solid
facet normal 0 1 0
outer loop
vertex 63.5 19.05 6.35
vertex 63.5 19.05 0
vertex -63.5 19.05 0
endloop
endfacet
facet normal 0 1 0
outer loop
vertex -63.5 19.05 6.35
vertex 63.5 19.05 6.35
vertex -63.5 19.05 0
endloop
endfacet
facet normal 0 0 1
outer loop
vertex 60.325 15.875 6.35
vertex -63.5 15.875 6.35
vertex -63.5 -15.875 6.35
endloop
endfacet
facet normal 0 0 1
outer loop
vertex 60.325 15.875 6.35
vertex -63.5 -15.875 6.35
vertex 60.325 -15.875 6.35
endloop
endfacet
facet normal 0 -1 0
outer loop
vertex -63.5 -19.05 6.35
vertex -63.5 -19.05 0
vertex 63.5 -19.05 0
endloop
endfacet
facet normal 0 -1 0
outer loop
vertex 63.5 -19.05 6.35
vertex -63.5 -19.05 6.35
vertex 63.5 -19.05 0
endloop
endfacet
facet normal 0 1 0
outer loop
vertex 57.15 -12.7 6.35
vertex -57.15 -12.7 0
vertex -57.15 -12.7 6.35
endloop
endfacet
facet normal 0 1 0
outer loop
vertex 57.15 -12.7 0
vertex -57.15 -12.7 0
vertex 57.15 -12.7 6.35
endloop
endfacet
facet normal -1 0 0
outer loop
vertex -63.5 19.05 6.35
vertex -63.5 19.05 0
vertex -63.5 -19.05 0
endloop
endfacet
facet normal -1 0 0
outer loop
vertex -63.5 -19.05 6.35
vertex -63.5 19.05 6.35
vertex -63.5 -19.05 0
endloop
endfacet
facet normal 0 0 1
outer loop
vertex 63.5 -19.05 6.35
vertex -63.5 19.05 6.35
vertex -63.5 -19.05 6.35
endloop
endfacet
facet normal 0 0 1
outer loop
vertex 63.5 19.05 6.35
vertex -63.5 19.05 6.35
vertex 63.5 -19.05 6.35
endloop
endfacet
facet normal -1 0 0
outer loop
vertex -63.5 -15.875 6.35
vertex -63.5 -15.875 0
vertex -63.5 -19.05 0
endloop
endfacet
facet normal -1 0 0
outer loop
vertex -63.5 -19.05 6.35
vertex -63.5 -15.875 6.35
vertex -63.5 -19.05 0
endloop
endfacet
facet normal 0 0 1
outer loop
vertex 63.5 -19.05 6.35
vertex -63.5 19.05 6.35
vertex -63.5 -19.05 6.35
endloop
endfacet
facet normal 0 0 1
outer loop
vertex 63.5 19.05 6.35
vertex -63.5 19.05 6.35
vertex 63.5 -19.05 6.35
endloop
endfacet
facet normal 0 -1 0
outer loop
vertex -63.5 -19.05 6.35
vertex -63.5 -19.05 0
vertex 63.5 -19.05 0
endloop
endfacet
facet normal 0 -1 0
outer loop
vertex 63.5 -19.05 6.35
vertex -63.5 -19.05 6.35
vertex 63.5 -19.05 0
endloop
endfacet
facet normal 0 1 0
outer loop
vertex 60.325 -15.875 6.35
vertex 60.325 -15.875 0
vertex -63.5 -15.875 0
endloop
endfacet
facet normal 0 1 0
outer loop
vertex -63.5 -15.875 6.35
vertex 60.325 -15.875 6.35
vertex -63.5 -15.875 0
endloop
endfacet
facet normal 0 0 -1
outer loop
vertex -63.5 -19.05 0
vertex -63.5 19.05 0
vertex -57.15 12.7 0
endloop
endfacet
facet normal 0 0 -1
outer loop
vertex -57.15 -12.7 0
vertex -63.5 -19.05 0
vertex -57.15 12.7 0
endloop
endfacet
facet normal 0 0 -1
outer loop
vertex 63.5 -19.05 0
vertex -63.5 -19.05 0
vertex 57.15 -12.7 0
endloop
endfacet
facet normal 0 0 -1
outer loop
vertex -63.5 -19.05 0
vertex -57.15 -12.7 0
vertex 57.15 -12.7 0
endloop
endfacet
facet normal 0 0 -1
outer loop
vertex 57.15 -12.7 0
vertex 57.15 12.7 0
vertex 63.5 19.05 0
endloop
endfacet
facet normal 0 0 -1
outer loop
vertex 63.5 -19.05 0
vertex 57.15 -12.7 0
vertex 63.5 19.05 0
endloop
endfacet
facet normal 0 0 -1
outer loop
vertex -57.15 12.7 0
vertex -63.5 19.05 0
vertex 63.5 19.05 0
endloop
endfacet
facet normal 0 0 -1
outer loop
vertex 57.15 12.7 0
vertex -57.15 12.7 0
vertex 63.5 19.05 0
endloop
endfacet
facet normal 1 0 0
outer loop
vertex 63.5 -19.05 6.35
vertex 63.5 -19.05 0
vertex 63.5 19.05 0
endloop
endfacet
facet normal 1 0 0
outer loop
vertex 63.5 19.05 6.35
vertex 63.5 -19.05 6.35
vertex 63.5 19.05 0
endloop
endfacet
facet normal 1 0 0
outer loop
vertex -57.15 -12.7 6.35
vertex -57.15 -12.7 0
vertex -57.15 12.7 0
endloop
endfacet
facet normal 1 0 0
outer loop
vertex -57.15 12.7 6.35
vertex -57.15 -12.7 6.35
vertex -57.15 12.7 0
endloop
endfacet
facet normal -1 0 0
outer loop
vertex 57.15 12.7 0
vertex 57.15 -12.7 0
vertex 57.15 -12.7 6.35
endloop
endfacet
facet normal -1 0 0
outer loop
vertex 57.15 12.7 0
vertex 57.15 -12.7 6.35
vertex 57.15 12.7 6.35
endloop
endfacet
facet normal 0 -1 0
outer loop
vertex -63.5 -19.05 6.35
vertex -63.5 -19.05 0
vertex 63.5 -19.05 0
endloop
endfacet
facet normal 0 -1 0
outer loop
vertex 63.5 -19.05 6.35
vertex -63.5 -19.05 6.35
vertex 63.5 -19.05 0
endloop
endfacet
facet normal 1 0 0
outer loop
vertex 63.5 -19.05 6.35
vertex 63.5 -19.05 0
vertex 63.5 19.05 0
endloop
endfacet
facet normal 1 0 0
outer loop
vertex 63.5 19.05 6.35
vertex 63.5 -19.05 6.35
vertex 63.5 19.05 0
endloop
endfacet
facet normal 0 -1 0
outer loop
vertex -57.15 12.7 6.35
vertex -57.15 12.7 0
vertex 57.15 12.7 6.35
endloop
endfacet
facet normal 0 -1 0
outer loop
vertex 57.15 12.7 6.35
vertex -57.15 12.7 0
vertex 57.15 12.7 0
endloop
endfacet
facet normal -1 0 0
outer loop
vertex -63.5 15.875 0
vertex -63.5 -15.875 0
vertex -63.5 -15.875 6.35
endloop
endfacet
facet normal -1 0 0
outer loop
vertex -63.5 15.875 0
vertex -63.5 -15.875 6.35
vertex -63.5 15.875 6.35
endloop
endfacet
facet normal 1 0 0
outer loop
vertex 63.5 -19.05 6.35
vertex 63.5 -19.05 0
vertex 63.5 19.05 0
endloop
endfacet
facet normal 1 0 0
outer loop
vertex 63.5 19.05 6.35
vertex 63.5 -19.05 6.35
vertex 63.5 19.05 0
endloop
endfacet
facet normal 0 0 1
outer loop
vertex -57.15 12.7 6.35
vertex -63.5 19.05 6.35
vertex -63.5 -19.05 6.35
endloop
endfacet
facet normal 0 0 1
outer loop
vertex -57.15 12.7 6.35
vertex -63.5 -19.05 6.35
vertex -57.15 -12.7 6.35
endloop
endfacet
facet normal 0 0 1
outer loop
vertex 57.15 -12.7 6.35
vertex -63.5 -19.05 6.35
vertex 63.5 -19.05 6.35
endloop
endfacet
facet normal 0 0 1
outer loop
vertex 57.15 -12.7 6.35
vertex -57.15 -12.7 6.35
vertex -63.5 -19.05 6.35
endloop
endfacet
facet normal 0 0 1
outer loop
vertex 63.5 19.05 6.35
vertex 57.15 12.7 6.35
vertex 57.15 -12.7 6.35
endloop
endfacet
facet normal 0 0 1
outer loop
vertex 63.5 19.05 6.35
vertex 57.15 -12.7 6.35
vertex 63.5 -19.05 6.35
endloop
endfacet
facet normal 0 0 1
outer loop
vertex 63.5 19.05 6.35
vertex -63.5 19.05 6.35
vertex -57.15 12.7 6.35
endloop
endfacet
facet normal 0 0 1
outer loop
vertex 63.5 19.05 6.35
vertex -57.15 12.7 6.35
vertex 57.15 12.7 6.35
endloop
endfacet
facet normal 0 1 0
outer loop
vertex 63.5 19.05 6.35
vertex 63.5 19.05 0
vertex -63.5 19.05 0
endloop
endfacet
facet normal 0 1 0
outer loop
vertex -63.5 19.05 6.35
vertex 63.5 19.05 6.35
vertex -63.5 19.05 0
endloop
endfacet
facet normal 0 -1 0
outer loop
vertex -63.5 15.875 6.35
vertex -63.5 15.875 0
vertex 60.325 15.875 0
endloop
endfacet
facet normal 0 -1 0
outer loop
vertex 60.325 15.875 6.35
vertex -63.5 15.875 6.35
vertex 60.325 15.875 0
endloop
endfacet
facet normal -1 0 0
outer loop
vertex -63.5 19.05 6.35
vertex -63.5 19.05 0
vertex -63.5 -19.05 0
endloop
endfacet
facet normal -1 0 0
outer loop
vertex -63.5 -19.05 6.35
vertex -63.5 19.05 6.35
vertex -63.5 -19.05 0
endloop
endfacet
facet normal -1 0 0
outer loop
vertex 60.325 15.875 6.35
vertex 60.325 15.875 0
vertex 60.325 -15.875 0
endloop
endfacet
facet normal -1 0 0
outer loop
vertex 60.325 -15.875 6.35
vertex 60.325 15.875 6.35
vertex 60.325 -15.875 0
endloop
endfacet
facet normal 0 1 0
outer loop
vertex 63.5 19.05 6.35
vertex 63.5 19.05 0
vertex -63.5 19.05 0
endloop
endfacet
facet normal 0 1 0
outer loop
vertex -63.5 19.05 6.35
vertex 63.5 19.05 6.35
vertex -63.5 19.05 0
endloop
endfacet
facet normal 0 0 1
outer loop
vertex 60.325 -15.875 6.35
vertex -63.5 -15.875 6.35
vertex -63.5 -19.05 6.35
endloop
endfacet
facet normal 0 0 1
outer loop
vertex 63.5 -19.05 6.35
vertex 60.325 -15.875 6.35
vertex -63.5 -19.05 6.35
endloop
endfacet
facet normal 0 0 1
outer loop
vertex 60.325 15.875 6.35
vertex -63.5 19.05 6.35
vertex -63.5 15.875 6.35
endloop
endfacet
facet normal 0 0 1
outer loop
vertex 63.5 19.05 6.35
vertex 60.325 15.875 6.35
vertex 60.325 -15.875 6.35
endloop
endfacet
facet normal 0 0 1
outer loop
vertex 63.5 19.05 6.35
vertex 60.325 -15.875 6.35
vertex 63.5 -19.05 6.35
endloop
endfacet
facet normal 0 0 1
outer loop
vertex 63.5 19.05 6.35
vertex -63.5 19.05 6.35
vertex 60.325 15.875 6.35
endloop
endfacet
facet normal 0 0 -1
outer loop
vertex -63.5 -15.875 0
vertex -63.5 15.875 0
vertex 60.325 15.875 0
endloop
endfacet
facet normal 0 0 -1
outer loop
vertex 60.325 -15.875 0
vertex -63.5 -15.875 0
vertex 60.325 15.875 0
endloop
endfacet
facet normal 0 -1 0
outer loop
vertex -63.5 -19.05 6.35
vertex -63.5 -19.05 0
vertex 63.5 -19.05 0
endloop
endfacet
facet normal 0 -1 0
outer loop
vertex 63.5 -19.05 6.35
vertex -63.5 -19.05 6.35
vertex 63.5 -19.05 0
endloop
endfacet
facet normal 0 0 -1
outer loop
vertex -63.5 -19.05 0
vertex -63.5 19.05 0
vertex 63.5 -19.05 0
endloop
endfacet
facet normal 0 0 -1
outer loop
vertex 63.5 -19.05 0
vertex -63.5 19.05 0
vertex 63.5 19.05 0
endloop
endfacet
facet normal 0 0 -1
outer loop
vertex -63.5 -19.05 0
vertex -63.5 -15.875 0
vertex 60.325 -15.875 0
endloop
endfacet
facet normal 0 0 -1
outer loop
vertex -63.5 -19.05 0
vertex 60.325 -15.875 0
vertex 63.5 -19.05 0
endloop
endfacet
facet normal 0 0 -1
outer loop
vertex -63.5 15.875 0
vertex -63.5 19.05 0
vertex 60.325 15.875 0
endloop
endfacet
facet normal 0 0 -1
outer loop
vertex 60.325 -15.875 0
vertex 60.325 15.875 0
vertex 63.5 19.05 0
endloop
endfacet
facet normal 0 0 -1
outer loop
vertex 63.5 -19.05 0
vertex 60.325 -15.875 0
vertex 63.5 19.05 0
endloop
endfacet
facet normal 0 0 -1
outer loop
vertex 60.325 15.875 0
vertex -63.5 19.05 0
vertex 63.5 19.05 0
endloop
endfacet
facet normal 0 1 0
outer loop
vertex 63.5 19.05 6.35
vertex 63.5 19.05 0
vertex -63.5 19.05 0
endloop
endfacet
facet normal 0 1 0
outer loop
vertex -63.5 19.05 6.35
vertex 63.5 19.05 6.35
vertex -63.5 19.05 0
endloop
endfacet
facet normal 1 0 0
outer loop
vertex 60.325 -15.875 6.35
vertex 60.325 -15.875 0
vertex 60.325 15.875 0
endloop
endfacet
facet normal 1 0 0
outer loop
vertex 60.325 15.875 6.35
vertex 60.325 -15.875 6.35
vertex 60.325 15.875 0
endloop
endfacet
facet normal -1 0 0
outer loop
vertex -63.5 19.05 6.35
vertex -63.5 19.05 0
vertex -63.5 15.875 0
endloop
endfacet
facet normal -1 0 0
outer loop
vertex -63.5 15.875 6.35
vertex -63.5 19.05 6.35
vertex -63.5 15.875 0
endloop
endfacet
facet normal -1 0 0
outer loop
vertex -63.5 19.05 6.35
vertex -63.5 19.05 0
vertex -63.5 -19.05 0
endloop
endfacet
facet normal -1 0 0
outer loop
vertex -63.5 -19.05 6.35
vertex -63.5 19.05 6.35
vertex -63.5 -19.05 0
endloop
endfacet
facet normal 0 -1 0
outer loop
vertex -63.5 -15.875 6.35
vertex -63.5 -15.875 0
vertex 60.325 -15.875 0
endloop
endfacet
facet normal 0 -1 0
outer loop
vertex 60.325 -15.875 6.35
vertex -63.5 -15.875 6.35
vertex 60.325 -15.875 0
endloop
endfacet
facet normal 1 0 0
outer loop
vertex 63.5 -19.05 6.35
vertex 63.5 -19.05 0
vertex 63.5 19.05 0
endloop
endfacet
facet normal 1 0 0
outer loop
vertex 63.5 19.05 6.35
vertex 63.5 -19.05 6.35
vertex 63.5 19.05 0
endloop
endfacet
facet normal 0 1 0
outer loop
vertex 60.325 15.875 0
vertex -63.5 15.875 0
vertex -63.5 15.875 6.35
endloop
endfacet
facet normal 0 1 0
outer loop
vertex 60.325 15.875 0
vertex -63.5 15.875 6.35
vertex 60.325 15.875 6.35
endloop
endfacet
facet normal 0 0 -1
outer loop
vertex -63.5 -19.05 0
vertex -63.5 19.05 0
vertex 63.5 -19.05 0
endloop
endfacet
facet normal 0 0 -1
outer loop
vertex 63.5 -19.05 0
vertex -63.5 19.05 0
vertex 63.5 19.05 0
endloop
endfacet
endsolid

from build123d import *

# Parameters (mm, degrees)
F1_W     = 123.825
F1_H     = 31.75
F1_W_2   = 114.3
F1_H_2   = 25.4
F2_DEPTH = 6.35
F3_DEPTH = 6.35
F4_DEPTH = 6.35
F5_DEPTH = 6.35
F6_DEPTH = 6.35


# Not quite as in the source:
# - a variable given as a bare number and used for a length is read in inches; the dataset says mm whatever the document's units were


with BuildPart() as f2:
    # F1 (on Top) → F2 (new body)
    with BuildSketch(Plane.XY):
        with Locations((-1.5875, 0)):
            Rectangle(F1_W, F1_H)
        Rectangle(F1_W_2, F1_H_2, mode=Mode.SUBTRACT)
        Rectangle(F1_W_2, F1_H_2)
        Polygon((-63.5, -19.05), (63.5, -19.05), (63.5, 19.05), (-63.5, 19.05), (-63.5, 15.875), (60.325, 15.875), (60.325, -15.875), (-63.5, -15.875), align=None)
    extrude(amount=F2_DEPTH)


with BuildPart() as f3:
    # F1 (on Top) → F3 (new body)
    with BuildSketch(Plane.XY):
        with Locations((-1.5875, 0)):
            Rectangle(F1_W, F1_H)
        Rectangle(F1_W_2, F1_H_2, mode=Mode.SUBTRACT)
        Polygon((-63.5, -19.05), (63.5, -19.05), (63.5, 19.05), (-63.5, 19.05), (-63.5, 15.875), (60.325, 15.875), (60.325, -15.875), (-63.5, -15.875), align=None)
    extrude(amount=F3_DEPTH)


with BuildPart() as f4:
    # F1 (on Top) → F4 (new body)
    with BuildSketch(Plane.XY):
        Polygon((-63.5, -19.05), (63.5, -19.05), (63.5, 19.05), (-63.5, 19.05), (-63.5, 15.875), (60.325, 15.875), (60.325, -15.875), (-63.5, -15.875), align=None)
    extrude(amount=F4_DEPTH)


with BuildPart() as f5:
    # F1 (on Top) → F5 (new body)
    with BuildSketch(Plane.XY):
        with Locations((-1.5875, 0)):
            Rectangle(F1_W, F1_H)
        Rectangle(F1_W_2, F1_H_2, mode=Mode.SUBTRACT)
        Rectangle(F1_W_2, F1_H_2)
    extrude(amount=F5_DEPTH)


with BuildPart() as f6:
    # F1 (on Top) → F6 (new body)
    with BuildSketch(Plane.XY):
        with Locations((-1.5875, 0)):
            Rectangle(F1_W, F1_H)
        Rectangle(F1_W_2, F1_H_2, mode=Mode.SUBTRACT)
        Rectangle(F1_W_2, F1_H_2)
        Polygon((-63.5, -19.05), (63.5, -19.05), (63.5, 19.05), (-63.5, 19.05), (-63.5, 15.875), (60.325, 15.875), (60.325, -15.875), (-63.5, -15.875), align=None)
    extrude(amount=F6_DEPTH)


solid = Compound([f2.part, f3.part, f4.part, f5.part, f6.part])
